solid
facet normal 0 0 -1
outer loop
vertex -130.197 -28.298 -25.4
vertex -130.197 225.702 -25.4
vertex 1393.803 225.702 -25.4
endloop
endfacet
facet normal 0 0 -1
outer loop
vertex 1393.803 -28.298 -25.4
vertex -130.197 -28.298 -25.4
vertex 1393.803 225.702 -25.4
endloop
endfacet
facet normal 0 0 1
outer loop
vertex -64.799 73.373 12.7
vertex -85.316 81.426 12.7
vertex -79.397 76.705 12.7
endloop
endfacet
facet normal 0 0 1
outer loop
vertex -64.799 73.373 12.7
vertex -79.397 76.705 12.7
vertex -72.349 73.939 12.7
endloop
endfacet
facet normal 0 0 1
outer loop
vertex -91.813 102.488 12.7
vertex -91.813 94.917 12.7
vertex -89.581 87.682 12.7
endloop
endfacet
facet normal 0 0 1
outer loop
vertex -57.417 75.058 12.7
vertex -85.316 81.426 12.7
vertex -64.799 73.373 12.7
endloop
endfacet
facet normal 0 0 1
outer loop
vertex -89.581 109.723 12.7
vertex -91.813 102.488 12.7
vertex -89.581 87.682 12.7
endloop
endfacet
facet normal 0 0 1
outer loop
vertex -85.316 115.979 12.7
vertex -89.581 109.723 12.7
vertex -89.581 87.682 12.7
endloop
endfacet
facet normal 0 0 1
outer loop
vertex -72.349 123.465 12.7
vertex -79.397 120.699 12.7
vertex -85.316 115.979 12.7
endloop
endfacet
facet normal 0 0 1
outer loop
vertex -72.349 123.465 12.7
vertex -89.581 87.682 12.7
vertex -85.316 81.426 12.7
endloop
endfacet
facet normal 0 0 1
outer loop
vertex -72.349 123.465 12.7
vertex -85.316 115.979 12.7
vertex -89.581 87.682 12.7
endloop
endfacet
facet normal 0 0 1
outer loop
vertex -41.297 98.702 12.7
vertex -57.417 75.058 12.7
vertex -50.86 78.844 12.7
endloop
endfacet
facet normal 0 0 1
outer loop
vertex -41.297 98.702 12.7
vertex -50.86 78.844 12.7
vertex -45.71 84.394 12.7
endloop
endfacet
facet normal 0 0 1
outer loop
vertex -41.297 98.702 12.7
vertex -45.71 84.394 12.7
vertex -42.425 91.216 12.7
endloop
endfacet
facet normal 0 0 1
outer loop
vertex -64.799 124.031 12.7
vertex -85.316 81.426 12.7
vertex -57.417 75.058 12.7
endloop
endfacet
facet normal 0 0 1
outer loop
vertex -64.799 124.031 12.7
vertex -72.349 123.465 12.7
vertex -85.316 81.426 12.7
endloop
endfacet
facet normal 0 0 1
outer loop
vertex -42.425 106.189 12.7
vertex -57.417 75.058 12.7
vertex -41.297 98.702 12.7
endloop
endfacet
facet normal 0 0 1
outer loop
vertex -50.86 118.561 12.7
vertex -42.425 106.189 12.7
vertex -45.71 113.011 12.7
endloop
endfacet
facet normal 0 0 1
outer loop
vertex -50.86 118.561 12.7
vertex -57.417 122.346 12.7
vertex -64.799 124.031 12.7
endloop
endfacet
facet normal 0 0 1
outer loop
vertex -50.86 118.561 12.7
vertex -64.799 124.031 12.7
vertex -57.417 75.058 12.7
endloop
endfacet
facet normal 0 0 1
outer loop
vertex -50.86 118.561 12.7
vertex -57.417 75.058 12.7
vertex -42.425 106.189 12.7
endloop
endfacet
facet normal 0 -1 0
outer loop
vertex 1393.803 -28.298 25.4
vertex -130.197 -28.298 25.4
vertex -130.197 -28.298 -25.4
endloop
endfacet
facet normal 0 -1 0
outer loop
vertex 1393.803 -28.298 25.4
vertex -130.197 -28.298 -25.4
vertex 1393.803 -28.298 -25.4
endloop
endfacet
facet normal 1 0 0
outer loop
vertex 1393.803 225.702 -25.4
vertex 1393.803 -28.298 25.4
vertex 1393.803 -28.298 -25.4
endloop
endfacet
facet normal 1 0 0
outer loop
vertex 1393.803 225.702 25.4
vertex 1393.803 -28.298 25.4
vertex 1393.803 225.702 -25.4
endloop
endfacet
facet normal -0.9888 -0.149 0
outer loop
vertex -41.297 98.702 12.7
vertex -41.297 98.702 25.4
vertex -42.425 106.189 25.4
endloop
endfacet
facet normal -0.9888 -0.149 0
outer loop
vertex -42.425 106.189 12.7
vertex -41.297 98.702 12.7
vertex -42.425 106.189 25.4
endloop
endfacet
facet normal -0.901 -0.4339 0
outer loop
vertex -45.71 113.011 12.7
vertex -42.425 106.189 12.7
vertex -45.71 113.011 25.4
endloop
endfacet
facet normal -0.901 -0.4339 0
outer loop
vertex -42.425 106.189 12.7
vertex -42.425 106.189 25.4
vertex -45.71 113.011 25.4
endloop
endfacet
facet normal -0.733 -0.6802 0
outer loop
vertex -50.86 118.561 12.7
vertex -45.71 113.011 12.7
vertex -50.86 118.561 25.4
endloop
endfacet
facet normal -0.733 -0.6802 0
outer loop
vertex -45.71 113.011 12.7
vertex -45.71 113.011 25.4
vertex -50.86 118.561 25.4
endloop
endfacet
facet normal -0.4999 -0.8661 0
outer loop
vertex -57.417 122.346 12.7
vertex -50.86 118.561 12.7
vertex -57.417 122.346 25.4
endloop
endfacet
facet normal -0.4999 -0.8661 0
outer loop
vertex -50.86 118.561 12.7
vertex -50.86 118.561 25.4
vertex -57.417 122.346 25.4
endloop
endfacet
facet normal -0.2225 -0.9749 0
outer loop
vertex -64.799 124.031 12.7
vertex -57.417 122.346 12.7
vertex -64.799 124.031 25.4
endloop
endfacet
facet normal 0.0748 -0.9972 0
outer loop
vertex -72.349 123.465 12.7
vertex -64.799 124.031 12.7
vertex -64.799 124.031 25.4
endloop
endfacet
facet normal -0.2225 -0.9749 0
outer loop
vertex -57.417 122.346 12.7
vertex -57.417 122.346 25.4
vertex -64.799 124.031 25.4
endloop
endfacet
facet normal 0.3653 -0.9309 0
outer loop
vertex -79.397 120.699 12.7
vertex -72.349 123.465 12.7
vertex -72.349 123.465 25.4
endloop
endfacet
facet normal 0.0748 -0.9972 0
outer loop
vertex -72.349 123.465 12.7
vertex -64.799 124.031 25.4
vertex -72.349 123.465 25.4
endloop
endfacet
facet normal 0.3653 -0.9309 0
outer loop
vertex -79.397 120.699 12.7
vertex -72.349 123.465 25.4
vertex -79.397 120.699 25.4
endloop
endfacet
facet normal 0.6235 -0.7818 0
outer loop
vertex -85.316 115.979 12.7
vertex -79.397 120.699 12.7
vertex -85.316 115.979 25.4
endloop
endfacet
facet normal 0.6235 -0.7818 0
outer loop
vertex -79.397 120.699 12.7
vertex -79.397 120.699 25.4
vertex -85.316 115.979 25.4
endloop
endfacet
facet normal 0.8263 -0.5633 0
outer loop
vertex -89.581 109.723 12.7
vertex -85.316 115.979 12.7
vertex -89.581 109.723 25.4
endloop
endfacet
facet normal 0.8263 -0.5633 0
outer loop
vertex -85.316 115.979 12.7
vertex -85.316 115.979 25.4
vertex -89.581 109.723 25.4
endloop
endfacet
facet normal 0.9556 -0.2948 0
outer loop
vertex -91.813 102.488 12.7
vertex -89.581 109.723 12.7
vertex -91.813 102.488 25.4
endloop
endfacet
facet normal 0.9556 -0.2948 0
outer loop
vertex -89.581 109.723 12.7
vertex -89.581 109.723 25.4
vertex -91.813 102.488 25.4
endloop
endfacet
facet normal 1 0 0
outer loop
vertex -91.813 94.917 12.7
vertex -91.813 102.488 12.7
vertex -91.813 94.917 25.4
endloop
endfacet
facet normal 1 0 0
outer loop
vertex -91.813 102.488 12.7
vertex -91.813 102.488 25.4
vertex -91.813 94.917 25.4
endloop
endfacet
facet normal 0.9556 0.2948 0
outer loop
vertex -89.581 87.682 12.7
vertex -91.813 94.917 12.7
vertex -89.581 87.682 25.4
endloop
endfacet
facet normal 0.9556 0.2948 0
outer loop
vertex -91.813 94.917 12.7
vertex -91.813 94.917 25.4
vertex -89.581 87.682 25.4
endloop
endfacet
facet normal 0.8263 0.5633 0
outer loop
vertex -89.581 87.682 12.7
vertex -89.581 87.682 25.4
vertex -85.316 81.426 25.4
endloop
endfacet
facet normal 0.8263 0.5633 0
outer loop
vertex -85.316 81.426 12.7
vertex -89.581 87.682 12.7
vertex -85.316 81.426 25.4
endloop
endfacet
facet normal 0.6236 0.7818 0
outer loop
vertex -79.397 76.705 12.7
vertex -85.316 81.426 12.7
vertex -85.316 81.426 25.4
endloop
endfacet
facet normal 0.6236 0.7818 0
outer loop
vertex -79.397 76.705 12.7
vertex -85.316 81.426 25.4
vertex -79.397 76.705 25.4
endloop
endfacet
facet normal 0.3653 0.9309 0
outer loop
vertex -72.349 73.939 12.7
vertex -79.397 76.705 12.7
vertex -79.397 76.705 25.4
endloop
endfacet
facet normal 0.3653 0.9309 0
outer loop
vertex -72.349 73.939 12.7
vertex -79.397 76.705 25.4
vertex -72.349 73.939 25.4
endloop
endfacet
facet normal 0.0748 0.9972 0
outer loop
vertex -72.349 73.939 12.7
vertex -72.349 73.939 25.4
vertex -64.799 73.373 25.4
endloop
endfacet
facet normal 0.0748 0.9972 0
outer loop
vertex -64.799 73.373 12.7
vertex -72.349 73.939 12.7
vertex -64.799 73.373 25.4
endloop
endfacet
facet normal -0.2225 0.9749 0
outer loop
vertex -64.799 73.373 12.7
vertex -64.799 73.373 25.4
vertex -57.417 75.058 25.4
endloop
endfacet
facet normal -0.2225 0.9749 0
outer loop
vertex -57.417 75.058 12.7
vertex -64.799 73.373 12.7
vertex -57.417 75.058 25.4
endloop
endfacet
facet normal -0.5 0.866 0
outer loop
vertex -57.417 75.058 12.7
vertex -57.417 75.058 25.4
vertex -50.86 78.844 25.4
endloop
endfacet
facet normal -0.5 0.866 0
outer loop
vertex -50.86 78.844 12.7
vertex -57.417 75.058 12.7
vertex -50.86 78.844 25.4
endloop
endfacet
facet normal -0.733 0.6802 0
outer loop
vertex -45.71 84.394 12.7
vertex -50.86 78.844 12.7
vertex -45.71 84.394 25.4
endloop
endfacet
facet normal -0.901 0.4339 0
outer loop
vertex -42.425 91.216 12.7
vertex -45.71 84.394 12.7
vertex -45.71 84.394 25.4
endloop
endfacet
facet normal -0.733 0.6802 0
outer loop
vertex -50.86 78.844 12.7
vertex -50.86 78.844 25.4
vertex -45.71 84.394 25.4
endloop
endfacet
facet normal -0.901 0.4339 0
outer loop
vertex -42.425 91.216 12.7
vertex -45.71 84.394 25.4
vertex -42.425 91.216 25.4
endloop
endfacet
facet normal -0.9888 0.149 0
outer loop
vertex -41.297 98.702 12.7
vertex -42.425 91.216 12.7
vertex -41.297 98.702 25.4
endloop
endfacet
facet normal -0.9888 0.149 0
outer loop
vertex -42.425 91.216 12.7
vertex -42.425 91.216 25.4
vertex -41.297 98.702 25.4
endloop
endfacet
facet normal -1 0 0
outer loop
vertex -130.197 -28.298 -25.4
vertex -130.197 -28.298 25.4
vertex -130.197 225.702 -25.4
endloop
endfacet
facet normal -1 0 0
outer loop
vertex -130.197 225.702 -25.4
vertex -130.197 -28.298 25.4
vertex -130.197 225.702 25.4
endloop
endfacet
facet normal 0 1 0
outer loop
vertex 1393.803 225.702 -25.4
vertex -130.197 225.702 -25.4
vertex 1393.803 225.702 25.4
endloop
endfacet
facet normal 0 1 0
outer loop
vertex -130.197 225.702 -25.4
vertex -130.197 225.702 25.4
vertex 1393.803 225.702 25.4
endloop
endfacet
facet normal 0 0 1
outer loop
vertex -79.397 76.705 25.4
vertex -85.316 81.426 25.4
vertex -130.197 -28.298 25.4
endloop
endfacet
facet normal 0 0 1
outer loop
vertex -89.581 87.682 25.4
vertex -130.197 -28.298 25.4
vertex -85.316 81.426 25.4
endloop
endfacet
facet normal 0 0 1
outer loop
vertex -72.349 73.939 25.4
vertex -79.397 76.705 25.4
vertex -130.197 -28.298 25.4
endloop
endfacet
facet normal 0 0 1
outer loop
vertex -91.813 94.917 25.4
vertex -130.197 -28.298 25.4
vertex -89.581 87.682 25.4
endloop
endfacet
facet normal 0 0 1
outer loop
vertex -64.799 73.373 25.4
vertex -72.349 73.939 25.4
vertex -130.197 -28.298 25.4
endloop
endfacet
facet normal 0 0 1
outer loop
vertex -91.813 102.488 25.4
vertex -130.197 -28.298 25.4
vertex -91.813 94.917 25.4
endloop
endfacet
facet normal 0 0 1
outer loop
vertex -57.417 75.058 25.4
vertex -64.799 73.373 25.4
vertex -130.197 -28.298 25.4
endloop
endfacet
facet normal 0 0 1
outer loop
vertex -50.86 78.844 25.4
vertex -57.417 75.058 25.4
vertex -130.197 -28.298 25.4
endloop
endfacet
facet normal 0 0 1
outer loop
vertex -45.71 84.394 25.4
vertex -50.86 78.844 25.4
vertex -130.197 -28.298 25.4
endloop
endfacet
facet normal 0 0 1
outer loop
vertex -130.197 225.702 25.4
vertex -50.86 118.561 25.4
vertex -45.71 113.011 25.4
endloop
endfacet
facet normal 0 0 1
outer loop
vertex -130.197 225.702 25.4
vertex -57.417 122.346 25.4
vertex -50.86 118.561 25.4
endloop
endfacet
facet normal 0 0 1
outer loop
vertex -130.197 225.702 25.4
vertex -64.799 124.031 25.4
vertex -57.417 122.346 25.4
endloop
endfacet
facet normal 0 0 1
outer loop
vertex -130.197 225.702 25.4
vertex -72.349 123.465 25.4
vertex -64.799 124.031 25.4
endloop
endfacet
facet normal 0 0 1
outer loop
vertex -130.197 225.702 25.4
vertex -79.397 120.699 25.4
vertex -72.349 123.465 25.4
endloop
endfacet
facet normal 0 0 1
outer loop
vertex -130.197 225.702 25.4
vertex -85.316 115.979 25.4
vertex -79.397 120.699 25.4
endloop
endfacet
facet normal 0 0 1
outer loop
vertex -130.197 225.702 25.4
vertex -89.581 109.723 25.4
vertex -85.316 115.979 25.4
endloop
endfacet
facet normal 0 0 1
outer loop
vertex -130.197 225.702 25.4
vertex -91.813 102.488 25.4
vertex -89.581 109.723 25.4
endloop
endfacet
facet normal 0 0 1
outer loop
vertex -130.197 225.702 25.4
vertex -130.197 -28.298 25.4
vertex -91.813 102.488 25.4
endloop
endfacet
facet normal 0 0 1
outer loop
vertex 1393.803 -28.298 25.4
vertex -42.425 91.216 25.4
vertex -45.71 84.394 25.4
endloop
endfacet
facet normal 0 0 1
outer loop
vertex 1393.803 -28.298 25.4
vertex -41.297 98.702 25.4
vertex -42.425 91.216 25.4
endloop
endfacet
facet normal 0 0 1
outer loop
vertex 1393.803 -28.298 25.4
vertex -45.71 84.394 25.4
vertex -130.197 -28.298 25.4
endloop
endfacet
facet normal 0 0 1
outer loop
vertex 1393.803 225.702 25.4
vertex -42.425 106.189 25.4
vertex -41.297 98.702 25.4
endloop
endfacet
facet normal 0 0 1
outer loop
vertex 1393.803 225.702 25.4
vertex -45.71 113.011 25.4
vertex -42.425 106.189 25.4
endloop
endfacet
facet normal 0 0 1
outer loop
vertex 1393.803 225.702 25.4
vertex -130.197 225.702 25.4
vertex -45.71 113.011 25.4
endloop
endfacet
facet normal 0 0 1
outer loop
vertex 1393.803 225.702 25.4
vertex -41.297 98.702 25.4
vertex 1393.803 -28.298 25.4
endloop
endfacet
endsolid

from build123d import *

# Parameters (mm, degrees)
F0_W     = 1524
F0_H     = 254
F1_DEPTH = 25.4
F2_R     = 25.4
F3_DEPTH = 12.7


with BuildPart() as f1:
    # F0 (on Top) → F1 (new body, symmetric)
    with BuildSketch(Plane.XY):
        with Locations((631.803309, 98.702285)):
            Rectangle(F0_W, F0_H)
    extrude(amount=F1_DEPTH, both=True)

    # F2 (on face) → F3 (cut)
    with BuildSketch(Plane.XY.offset(25.4)):
        with Locations((-66.696691, 98.702285)):
            Circle(F2_R)
    extrude(amount=-F3_DEPTH, mode=Mode.SUBTRACT)


solid = f1.part
